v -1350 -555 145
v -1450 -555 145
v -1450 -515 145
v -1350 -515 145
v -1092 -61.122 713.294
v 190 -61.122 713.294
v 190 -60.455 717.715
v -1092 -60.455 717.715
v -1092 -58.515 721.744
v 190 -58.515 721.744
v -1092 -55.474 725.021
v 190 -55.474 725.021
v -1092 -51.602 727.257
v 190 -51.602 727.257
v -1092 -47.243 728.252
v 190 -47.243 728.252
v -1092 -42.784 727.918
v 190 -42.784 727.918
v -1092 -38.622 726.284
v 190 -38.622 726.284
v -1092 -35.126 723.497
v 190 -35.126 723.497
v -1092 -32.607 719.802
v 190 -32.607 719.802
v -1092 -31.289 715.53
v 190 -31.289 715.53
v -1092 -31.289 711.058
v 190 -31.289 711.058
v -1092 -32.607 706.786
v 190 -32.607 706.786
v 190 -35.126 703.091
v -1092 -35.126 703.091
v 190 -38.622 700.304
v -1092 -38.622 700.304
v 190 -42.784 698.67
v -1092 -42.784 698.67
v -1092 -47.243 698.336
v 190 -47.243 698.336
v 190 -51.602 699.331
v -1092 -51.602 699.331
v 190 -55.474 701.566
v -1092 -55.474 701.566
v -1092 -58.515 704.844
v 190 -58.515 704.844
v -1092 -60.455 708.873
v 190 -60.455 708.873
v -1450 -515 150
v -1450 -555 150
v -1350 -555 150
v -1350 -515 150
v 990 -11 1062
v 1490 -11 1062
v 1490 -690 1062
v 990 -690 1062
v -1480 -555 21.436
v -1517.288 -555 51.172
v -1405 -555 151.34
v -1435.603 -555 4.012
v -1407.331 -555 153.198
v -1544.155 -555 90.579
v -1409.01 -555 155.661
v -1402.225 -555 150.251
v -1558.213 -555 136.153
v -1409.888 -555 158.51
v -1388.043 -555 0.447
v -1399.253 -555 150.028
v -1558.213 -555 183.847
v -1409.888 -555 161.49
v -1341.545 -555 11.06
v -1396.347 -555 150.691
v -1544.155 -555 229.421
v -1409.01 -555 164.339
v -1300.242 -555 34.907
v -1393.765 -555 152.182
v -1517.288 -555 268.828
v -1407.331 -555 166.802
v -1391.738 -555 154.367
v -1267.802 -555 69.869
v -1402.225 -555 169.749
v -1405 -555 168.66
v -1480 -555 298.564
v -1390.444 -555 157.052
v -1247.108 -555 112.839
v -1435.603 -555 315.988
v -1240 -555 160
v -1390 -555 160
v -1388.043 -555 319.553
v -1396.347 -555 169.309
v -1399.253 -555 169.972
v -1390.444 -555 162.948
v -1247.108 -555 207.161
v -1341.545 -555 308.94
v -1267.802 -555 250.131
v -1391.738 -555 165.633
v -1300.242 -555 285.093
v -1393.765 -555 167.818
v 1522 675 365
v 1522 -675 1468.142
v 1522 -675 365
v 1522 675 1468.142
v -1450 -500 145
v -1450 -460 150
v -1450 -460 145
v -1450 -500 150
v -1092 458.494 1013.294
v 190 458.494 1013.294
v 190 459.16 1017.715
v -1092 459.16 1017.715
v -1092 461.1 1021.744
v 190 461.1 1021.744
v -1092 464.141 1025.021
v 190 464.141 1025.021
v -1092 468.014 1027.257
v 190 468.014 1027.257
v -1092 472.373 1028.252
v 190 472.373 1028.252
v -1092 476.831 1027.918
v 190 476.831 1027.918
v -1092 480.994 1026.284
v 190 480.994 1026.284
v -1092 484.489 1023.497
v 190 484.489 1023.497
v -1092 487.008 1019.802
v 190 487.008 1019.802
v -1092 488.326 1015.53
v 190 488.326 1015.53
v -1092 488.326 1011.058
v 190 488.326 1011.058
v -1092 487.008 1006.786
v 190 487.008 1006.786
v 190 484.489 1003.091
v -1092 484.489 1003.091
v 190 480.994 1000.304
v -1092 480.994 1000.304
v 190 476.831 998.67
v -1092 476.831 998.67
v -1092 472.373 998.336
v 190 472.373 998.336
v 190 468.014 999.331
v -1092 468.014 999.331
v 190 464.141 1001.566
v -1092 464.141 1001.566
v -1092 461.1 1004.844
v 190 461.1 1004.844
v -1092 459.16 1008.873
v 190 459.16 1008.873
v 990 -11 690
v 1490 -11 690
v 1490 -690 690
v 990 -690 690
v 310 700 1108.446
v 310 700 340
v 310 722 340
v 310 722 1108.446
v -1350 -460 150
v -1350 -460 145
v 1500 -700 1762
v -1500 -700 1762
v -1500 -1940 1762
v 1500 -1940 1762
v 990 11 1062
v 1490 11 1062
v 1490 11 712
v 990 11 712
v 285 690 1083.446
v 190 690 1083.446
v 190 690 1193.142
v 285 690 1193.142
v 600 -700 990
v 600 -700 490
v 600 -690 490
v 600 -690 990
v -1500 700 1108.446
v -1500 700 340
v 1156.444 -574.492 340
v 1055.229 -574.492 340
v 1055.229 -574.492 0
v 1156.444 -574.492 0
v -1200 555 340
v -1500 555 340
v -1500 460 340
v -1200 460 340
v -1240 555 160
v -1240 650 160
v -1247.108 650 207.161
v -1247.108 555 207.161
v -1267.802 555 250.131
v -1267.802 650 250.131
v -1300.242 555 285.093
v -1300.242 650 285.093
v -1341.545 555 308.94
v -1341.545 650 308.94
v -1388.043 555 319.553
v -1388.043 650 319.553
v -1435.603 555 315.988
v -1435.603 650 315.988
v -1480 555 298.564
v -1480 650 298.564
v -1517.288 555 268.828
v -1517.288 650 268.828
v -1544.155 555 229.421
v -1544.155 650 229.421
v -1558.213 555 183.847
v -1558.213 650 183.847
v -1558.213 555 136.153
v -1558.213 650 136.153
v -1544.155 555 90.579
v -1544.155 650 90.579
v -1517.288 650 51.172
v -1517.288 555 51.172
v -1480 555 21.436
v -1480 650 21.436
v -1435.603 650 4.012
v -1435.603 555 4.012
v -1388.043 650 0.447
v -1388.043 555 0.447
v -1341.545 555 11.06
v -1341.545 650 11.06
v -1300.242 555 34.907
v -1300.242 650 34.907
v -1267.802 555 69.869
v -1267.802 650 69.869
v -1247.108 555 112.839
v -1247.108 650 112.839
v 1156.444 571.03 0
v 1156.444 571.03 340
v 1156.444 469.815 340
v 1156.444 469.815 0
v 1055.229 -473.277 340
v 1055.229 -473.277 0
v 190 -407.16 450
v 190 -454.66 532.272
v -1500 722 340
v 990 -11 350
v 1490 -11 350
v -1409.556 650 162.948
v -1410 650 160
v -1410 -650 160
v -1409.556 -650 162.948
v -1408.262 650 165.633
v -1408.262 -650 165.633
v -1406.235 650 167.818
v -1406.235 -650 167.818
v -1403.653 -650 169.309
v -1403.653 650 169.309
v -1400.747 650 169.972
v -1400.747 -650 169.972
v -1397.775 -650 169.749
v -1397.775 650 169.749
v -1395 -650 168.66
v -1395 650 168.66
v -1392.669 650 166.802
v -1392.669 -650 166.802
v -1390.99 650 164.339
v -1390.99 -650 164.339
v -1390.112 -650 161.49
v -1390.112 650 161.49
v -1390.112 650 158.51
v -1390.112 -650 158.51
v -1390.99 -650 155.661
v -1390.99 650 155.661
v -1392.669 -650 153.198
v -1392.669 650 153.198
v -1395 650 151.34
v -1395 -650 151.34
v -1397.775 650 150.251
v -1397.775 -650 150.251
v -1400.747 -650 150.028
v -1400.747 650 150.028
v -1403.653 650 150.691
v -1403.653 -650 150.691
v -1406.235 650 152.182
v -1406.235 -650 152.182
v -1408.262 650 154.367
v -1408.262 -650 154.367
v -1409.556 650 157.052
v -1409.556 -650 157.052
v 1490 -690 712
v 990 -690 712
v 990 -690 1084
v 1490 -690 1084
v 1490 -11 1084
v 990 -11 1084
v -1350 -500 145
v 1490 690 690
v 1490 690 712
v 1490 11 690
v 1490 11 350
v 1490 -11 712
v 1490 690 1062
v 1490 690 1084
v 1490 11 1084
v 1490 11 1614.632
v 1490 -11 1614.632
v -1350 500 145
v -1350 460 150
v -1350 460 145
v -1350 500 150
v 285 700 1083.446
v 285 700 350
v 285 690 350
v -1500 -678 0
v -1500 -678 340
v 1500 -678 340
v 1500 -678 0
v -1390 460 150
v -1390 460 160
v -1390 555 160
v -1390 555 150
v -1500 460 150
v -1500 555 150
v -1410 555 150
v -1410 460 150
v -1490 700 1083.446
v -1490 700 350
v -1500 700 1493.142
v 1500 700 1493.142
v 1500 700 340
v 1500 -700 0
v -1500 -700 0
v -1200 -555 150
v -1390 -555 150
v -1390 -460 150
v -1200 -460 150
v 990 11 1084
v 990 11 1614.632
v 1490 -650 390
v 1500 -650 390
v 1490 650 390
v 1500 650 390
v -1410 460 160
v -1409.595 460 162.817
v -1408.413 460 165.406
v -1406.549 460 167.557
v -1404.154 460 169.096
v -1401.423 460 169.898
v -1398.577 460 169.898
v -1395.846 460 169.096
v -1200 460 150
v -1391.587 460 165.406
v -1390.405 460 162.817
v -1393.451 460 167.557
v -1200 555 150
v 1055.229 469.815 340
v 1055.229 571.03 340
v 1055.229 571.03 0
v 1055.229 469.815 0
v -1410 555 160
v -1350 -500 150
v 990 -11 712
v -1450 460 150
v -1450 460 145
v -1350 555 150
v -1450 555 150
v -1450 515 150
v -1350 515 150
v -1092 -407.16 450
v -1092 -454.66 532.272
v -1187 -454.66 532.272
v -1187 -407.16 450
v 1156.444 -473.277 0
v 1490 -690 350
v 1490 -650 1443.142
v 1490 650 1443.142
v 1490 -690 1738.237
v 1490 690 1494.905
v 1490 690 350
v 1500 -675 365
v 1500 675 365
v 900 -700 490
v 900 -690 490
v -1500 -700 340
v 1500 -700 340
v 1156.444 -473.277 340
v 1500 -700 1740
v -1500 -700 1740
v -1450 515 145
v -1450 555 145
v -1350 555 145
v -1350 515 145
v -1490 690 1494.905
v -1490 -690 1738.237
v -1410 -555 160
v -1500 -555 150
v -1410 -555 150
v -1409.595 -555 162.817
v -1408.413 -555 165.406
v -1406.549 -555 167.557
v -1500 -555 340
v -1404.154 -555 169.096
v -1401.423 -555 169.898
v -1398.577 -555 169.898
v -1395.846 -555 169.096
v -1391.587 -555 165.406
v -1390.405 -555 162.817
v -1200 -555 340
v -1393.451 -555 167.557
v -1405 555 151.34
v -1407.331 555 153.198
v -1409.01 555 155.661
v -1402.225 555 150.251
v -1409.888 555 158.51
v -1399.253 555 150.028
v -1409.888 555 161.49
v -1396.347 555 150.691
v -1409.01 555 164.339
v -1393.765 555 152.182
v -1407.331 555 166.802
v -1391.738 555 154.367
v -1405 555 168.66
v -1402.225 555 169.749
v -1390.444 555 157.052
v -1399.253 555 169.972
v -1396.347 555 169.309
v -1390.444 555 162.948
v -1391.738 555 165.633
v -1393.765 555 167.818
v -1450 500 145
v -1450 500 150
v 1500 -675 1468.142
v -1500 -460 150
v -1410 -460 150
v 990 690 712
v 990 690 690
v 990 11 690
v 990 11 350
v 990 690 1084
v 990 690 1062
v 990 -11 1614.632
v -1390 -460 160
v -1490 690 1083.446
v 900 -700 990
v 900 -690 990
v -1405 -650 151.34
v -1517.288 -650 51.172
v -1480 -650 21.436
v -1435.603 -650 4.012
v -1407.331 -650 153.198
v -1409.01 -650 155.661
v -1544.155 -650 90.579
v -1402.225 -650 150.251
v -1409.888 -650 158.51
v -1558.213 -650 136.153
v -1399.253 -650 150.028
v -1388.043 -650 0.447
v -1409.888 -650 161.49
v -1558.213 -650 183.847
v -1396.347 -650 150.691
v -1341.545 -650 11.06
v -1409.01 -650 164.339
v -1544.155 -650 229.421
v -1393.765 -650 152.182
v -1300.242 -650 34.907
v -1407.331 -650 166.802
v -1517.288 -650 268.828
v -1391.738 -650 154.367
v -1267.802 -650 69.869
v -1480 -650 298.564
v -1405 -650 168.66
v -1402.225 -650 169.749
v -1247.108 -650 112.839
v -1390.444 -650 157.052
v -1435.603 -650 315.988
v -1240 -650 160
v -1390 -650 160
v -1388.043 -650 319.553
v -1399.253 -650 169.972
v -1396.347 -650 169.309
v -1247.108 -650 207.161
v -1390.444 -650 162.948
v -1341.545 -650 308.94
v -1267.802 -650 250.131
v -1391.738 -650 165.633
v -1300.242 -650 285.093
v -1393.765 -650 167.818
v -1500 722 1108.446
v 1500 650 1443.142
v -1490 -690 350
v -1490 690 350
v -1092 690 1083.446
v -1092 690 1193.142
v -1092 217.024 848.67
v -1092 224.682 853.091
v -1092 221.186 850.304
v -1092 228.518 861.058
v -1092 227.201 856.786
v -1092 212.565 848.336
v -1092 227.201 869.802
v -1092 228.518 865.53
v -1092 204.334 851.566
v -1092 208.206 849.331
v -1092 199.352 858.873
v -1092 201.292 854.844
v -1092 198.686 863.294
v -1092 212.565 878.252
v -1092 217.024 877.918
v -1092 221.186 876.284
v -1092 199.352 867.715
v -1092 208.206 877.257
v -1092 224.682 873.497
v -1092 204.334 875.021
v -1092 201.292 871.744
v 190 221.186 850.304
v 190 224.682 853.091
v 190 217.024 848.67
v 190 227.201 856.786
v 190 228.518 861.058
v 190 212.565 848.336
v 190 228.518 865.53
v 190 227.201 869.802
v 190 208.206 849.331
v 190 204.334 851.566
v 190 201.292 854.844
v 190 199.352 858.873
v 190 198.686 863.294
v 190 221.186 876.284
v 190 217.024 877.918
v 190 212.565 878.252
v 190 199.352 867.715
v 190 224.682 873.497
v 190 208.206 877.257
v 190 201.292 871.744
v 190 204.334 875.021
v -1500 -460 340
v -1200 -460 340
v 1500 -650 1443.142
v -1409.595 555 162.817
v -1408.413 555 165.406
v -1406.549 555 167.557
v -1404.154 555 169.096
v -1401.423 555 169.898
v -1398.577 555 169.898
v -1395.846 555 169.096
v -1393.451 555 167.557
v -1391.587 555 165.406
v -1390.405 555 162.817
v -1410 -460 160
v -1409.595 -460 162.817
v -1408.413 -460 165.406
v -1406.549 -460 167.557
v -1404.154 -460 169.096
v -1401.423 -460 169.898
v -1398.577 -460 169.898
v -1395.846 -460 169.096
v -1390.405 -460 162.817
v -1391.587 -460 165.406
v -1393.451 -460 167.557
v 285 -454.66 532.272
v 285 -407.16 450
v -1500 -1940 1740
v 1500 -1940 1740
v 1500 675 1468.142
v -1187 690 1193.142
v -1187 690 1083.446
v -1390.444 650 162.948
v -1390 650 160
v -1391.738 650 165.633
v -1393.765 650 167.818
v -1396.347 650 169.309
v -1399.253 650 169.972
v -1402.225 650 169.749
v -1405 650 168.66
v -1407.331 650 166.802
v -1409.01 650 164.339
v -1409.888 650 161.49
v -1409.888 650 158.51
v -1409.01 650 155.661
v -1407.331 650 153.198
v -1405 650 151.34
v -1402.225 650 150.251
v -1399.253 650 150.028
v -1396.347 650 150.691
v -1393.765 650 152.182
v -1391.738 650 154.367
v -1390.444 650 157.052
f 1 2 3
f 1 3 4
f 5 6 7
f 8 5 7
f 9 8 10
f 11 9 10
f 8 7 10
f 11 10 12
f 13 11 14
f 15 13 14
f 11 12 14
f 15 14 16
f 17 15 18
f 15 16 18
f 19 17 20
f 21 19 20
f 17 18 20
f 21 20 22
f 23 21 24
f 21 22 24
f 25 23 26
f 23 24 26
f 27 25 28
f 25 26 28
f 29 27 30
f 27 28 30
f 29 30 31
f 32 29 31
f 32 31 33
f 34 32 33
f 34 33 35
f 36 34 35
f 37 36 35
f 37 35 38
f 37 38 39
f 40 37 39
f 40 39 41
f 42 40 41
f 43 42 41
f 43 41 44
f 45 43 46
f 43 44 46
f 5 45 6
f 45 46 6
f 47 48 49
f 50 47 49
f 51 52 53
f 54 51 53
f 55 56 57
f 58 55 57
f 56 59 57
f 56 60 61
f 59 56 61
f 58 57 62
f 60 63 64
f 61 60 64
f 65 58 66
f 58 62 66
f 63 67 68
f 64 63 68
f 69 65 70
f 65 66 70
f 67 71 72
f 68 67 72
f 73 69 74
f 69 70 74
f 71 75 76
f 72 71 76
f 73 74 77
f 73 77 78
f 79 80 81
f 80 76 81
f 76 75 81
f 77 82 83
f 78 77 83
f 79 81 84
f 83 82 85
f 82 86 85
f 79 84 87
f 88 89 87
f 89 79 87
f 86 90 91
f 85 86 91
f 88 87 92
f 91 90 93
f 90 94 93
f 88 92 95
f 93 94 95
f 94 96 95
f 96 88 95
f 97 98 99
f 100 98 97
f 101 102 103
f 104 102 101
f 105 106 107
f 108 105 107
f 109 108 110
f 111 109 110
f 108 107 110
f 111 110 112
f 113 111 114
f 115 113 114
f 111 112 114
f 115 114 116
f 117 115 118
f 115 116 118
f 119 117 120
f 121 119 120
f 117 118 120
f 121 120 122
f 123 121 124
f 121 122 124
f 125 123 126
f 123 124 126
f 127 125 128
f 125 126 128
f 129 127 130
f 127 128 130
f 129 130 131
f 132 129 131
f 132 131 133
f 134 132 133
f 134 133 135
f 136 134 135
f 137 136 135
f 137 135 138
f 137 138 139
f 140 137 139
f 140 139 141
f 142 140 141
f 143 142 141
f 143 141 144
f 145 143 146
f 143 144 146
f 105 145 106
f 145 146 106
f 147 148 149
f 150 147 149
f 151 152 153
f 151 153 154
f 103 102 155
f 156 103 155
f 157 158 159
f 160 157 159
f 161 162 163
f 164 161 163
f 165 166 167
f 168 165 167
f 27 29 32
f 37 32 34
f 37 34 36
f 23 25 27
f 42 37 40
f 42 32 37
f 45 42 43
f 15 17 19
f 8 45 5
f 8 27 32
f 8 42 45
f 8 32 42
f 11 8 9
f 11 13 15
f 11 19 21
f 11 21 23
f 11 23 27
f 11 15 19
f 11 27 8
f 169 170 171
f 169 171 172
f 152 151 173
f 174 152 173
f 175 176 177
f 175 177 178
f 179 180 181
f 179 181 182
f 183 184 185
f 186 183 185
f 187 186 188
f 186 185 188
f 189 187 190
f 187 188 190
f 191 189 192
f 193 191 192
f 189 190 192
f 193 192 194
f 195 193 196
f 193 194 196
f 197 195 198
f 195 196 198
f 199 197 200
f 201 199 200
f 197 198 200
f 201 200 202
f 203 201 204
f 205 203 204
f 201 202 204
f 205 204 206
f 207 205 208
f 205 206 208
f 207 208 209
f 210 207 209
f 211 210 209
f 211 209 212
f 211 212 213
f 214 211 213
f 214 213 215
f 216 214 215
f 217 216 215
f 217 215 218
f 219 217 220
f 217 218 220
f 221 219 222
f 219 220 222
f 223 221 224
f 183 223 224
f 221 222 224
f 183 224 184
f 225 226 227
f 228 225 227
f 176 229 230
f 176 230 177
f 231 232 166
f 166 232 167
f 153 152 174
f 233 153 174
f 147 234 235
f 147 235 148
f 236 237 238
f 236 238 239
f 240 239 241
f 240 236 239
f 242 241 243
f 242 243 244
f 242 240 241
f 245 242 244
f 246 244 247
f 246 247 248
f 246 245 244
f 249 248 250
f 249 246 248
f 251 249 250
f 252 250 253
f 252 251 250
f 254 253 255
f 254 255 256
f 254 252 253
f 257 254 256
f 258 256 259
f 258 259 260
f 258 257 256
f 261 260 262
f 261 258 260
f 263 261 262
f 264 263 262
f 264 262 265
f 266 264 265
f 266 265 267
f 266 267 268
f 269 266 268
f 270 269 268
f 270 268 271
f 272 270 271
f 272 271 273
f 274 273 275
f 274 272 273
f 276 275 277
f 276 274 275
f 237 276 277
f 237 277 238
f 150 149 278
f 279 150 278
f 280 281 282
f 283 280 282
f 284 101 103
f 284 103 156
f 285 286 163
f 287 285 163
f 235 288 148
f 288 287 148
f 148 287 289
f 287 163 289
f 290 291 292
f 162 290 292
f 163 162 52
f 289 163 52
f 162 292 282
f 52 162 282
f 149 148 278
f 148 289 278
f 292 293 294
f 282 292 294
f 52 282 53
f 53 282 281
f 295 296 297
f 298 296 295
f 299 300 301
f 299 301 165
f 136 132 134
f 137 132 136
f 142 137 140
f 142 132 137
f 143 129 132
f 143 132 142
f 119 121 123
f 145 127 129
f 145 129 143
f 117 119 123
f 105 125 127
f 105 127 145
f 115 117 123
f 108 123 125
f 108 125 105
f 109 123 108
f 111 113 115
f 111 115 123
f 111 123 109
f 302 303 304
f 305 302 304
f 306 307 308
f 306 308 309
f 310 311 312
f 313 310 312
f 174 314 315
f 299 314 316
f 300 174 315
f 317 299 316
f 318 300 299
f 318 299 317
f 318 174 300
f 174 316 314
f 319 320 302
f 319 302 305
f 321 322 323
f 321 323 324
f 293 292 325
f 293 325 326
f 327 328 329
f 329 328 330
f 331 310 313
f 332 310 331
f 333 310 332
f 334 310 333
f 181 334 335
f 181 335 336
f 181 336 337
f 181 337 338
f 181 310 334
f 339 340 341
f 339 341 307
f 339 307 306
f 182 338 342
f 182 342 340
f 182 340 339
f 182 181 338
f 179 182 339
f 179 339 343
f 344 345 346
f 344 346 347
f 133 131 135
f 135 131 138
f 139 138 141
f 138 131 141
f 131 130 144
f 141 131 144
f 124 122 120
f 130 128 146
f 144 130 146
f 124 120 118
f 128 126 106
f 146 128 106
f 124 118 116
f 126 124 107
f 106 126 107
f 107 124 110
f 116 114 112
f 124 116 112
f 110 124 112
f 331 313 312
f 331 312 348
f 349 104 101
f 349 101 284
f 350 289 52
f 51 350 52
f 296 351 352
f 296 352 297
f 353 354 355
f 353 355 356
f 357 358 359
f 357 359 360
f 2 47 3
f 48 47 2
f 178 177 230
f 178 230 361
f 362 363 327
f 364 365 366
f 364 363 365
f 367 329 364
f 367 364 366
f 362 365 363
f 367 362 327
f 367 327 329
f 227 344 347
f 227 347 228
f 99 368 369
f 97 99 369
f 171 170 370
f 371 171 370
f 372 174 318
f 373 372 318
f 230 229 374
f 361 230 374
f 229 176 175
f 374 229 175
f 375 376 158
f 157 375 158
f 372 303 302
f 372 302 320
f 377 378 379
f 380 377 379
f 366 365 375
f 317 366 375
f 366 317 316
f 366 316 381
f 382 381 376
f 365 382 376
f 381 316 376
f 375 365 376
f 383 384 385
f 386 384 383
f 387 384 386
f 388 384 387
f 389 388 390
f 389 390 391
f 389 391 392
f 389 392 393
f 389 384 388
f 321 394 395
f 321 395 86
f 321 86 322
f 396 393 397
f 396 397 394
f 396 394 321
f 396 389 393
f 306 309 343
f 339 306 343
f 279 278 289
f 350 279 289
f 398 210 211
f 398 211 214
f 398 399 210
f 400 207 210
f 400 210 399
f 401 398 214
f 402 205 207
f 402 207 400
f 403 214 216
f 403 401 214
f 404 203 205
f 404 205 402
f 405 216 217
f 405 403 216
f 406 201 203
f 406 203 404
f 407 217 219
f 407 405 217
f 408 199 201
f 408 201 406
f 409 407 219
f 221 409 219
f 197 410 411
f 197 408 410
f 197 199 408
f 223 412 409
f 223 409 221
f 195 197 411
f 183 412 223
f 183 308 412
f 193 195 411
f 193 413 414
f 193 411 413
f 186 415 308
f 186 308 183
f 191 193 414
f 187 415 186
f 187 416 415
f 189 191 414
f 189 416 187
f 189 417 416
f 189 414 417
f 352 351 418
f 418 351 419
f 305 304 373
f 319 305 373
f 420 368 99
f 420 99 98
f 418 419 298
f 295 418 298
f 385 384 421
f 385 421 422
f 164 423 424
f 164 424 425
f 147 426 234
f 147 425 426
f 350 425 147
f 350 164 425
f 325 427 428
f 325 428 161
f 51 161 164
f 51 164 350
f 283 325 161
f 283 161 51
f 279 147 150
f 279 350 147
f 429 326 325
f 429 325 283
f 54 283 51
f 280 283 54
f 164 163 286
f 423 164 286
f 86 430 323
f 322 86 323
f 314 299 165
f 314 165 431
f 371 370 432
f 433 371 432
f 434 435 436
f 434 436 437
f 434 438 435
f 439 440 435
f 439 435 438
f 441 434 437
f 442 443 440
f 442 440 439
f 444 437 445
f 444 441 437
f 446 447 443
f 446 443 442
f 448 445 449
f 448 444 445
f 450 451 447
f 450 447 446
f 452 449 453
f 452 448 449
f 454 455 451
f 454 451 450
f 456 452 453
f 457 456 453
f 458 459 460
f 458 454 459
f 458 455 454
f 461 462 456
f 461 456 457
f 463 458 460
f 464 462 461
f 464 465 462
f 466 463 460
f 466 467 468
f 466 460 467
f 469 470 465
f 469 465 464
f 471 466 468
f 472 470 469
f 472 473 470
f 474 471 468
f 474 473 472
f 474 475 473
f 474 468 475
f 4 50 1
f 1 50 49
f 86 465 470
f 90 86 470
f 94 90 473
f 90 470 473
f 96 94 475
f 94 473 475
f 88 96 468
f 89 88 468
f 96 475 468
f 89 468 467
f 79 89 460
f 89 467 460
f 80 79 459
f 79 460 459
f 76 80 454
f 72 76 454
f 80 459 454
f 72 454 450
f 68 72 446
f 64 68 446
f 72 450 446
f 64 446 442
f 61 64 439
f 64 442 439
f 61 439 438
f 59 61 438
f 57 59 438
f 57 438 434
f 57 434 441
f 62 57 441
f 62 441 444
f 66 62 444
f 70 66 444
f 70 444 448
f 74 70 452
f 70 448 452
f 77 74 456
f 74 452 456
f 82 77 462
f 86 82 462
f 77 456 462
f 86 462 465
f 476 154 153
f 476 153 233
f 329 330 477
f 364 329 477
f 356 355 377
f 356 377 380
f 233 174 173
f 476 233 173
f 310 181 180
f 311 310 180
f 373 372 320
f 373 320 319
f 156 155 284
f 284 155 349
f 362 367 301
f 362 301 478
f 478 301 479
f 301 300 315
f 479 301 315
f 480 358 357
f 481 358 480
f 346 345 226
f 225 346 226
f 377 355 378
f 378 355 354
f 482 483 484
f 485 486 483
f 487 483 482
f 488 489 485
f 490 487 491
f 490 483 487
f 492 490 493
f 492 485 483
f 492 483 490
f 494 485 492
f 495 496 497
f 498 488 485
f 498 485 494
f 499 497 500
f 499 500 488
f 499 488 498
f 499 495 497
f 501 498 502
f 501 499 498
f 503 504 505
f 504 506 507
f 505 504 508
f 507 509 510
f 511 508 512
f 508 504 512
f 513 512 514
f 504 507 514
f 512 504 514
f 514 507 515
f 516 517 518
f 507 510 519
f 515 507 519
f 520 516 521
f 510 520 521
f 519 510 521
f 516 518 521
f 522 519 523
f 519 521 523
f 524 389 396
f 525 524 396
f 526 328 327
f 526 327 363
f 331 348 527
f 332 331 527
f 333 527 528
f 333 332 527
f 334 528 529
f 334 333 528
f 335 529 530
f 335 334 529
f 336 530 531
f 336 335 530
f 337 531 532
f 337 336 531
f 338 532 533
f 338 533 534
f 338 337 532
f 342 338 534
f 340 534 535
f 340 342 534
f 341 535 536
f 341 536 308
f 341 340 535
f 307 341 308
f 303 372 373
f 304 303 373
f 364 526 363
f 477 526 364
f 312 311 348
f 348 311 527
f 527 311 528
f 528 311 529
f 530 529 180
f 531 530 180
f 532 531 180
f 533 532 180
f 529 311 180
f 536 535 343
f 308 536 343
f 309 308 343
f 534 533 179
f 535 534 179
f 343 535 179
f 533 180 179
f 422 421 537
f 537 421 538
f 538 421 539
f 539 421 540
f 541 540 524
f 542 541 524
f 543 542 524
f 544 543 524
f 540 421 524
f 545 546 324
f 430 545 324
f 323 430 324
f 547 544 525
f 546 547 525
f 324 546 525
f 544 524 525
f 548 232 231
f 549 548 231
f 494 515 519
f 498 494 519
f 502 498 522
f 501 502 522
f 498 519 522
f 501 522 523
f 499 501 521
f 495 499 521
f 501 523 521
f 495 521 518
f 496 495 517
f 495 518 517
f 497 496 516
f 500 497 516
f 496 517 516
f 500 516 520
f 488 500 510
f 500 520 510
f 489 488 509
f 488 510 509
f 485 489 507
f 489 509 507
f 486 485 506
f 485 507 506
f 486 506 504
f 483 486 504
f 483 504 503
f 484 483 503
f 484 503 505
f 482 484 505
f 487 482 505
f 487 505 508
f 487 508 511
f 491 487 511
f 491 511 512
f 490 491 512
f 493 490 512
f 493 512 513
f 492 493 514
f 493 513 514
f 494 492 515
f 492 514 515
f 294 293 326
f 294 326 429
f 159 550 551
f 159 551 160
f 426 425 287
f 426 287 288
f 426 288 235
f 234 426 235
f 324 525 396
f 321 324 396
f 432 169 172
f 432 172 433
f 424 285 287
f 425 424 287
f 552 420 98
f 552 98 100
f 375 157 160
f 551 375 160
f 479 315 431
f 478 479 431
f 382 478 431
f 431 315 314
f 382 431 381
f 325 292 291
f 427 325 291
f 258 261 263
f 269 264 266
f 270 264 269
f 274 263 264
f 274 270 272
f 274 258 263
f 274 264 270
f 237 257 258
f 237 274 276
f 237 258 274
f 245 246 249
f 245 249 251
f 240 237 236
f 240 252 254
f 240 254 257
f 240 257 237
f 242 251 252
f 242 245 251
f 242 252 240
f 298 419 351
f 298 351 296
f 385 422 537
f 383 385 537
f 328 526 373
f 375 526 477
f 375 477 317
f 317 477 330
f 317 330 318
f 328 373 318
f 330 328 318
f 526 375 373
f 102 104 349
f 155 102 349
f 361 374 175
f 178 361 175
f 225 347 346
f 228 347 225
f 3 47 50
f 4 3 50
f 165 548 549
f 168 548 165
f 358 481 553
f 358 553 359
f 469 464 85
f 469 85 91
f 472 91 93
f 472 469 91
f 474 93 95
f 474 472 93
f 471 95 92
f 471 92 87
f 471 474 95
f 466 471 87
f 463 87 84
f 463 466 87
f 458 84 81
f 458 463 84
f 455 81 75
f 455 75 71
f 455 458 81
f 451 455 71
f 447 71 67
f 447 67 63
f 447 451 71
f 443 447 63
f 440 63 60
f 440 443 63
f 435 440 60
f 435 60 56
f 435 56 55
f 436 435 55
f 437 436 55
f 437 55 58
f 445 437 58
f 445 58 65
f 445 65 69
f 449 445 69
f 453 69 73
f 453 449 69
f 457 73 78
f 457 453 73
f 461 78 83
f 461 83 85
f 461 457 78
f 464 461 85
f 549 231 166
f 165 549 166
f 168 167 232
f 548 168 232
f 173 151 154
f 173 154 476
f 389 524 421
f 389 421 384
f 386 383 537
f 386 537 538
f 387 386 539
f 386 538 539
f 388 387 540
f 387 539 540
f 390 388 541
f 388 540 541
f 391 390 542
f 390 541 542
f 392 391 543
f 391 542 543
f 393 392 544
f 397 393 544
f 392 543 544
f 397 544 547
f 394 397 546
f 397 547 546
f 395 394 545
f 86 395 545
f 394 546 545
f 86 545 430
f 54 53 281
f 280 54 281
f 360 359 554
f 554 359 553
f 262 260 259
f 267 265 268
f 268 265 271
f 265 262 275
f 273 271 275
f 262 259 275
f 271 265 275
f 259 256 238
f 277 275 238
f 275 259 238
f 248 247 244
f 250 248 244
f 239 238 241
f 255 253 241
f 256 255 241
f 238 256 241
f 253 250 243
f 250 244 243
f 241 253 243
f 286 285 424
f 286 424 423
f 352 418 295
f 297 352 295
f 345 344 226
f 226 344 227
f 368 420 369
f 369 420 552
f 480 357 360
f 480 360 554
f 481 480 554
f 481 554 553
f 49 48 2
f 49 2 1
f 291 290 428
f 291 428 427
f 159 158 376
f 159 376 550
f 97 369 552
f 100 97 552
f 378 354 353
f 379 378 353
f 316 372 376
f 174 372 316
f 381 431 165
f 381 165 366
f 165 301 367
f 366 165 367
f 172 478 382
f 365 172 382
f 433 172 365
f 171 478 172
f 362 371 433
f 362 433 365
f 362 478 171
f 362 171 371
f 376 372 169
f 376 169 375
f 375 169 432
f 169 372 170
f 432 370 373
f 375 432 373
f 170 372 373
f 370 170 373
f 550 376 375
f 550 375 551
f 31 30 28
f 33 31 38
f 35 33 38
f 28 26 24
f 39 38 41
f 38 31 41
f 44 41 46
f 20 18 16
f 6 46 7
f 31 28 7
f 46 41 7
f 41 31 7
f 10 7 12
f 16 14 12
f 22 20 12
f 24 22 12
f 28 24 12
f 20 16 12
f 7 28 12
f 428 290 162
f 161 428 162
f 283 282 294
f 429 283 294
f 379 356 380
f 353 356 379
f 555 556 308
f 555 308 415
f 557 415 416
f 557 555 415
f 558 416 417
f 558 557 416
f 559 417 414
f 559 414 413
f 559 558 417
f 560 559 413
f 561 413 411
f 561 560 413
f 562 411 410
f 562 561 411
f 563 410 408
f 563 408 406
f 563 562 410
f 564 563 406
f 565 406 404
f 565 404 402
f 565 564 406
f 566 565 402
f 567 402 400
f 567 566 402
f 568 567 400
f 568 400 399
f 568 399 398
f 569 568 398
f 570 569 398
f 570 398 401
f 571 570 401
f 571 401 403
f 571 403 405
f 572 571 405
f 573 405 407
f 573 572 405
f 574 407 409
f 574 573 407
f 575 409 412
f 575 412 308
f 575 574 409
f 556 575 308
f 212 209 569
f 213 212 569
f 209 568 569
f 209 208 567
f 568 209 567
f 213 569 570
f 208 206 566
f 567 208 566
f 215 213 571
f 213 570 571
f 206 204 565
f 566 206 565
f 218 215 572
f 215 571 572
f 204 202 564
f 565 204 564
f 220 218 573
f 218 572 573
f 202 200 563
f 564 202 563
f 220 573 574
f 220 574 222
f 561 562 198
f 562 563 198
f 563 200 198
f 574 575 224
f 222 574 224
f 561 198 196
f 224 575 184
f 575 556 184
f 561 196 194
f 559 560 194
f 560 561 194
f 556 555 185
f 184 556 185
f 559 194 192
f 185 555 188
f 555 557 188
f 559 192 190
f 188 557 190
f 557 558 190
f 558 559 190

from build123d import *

# Parameters (mm, degrees)
F5_W      = 3000
F5_H      = 1400
F6_DEPTH  = 1400
F7_T      = -10
F10_DEPTH = 3000.001
F11_W     = 22
F11_H     = 340
F11_H_2   = 22
F11_W_2   = 679
F11_H_3   = 350
F11_H_4   = 530.6315167163
F12_DEPTH = 500
F13_W     = 1300
F13_H     = 1053.1422270081
F14_DEPTH = 25
F15_W     = 1350
F15_H     = 1103.1422270081
F16_DEPTH = 22
F19_DEPTH = 95
F21_R     = 15
F22_DEPTH = 1282
F23_W     = 300
F23_H     = 500
F24_DEPTH = 25
F25_W     = 1240
F25_H     = 22
F26_DEPTH = 3000
F27_W     = 1775
F27_H     = 733.4456758621
F28_DEPTH = 25
F29_W     = 1810
F29_H     = 768.4456758621
F30_DEPTH = 22
F31_W     = 3000
F31_H     = 22
F32_DEPTH = 340
F33_W     = 101.2148975914
F33_H     = 101.2148975914
F34_DEPTH = 340
F36_R     = 160
F36_R_2   = 10
F37_DEPTH = 95
F38_W     = 300
F38_H     = 95
F39_DEPTH = 190
F41_DEPTH = 1480.001
F42_W     = 100
F42_H     = 40
F43_DEPTH = 5
F45_R     = 10
F46_DEPTH = 1300


# Not quite as in the source:
# - a feature of the source that left no trace in its solid (it failed there, or was rolled back) is left out
# - a pattern or mirror of a feature is missing from the dataset's text; its kind, count and spacing are read off the source's solid


with BuildPart() as f6:
    # F5 (on offset) → F6 (new body)
    with BuildSketch(Plane.XY.offset(340)):
        Rectangle(F5_W, F5_H)
    extrude(amount=F6_DEPTH)

    # F7
    f7_openings = [f6.faces().sort_by_distance(p)[0] for p in [
        (0, 0, 1740),
    ]]
    offset(amount=F7_T, openings=f7_openings)

    # F9 (on face) → F10 (cut, through all)
    with BuildSketch(Plane(origin=(-1500, 0, 0), x_dir=(0, -1, 0), z_dir=(-1, 0, 0))):
        Polygon((-923.6419556025, 1453.708116217), (851.2289943782, 1766.6657519743), (692.6008882609, 2226.9985032484), (-1018.4111959435, 1991.1711860221), align=None)
    extrude(amount=-F10_DEPTH, mode=Mode.SUBTRACT)

    # F13 (on face) → F14 (cut)
    with BuildSketch(Plane.YZ.offset(1500)):
        with Locations((0, 916.5711135041)):
            Rectangle(F13_W, F13_H)
    extrude(amount=-F14_DEPTH, mode=Mode.SUBTRACT)

    # F23 (on face) → F24 (cut)
    with BuildSketch(Plane.XZ.offset(700)):
        with Locations((750, 740)):
            Rectangle(F23_W, F23_H)
    extrude(amount=-F24_DEPTH, mode=Mode.SUBTRACT)

    # F27 (on face) → F28 (cut)
    with BuildSketch(Plane(origin=(0, 700, 0), x_dir=(-1, 0, 0), z_dir=(0, 1, 0))):
        with Locations((602.5, 716.7228379311)):
            Rectangle(F27_W, F27_H)
    extrude(amount=-F28_DEPTH, mode=Mode.SUBTRACT)


with BuildPart() as f12:
    # F11 (on face) → F12 (new body)
    with BuildSketch(Plane(origin=(1490, 0, 0), x_dir=(0, -1, 0), z_dir=(-1, 0, 0))):
        with Locations((0, 520)):
            Rectangle(F11_W, F11_H)
        with Locations((0, 701)):
            Rectangle(F11_W, F11_H_2)
        with Locations((350.5, 701)):
            Rectangle(F11_W_2, F11_H_2)
        with Locations((-350.5, 701)):
            Rectangle(F11_W_2, F11_H_2)
        with Locations((0, 887)):
            Rectangle(F11_W, F11_H_3)
        with Locations((0, 1073)):
            Rectangle(F11_W, F11_H_2)
        with Locations((350.5, 1073)):
            Rectangle(F11_W_2, F11_H_2)
        with Locations((-350.5, 1073)):
            Rectangle(F11_W_2, F11_H_2)
        with Locations((0, 1349.3157583581)):
            Rectangle(F11_W, F11_H_4)
    extrude(amount=F12_DEPTH)


with BuildPart() as f16:
    # F15 (on face) → F16 (new body)
    with BuildSketch(Plane.YZ.offset(1500)):
        with Locations((0, 916.5711135041)):
            Rectangle(F15_W, F15_H)
    extrude(amount=F16_DEPTH)


with BuildPart() as f19:
    # F18 (on offset) → F19 (new body)
    with BuildSketch(Plane.YZ.offset(190)):
        Polygon((690, 1083.4456758621), (690, 1193.1422270081), (-454.660094428, 532.2724133595), (-407.160094428, 450), align=None)
    extrude(amount=F19_DEPTH)


with BuildPart() as f19_copies_1:
    # F19_copies: instance of F19
    add(f19.part.mirror(Plane(origin=(-451, 0, 0), x_dir=(0, 0, -1), z_dir=(-1, 0, 0))))


with BuildPart() as f22:
    # F21 (on face) → F22 (new body, through all)
    with BuildSketch(Plane(origin=(190, 0, 0), x_dir=(0, -1, 0), z_dir=(-1, 0, 0))):
        with Locations((-473.4936490539, 1013.2939514351)):
            Circle(F21_R)
    extrude(amount=F22_DEPTH)


with BuildPart() as f22b:
    # F21 (on face) → F22, piece 2 (new body, through all)
    with BuildSketch(Plane(origin=(190, 0, 0), x_dir=(0, -1, 0), z_dir=(-1, 0, 0))):
        with Locations((-213.6860279186, 863.2939514351)):
            Circle(F21_R)
    extrude(amount=F22_DEPTH)


with BuildPart() as f22c:
    # F21 (on face) → F22, piece 3 (new body, through all)
    with BuildSketch(Plane(origin=(190, 0, 0), x_dir=(0, -1, 0), z_dir=(-1, 0, 0))):
        with Locations((46.1215932168, 713.2939514351)):
            Circle(F21_R)
    extrude(amount=F22_DEPTH)


with BuildPart() as f26:
    # F25 (on face) → F26 (new body, through all)
    with BuildSketch(Plane(origin=(-1500, 0, 0), x_dir=(0, -1, 0), z_dir=(-1, 0, 0))):
        with Locations((1320, 1751)):
            Rectangle(F25_W, F25_H)
    extrude(amount=-F26_DEPTH)


with BuildPart() as f30:
    # F29 (on face) → F30 (new body)
    with BuildSketch(Plane(origin=(0, 700, 0), x_dir=(-1, 0, 0), z_dir=(0, 1, 0))):
        with Locations((595, 724.2228379311)):
            Rectangle(F29_W, F29_H)
    extrude(amount=F30_DEPTH)


with BuildPart() as f32:
    # F31 (on face) → F32 (new body)
    with BuildSketch(Plane(origin=(0, 0, 340), x_dir=(1, 0, 0), z_dir=(0, 0, -1))):
        with Locations((0, 689)):
            Rectangle(F31_W, F31_H)
    extrude(amount=F32_DEPTH)


with BuildPart() as f34:
    # F33 (on face) → F34 (new body)
    with BuildSketch(Plane(origin=(0, 0, 340), x_dir=(1, 0, 0), z_dir=(0, 0, -1))):
        with Locations((1105.8368849942, 523.8840551683)):
            Rectangle(F33_W, F33_H)
    extrude(amount=F34_DEPTH)


with BuildPart() as f34b:
    # F33 (on face) → F34, piece 2 (new body)
    with BuildSketch(Plane(origin=(0, 0, 340), x_dir=(1, 0, 0), z_dir=(0, 0, -1))):
        with Locations((1105.8368849942, -520.4225837978)):
            Rectangle(F33_W, F33_H)
    extrude(amount=F34_DEPTH)


with BuildPart() as f37:
    # F36 (on offset) → F37 (new body)
    with BuildSketch(Plane.XZ.offset(650)):
        with Locations((-1400, 160)):
            Circle(F36_R)
        with Locations((-1400, 160)):
            Circle(F36_R_2, mode=Mode.SUBTRACT)
    extrude(amount=-F37_DEPTH)


with BuildPart() as f39:
    # F38 (on face) → F39 (new body)
    with BuildSketch(Plane(origin=(0, 0, 340), x_dir=(1, 0, 0), z_dir=(0, 0, -1))):
        with Locations((-1350, 507.5)):
            Rectangle(F38_W, F38_H)
    extrude(amount=F39_DEPTH)

    # F40 (on face) → F41 (cut, through all)
    with BuildSketch(Plane(origin=(0, -460, 0), x_dir=(-1, 0, 0), z_dir=(0, 1, 0))):
        with BuildLine():
            Line((1410, 150), (1410, 160))
            ThreePointArc((1410, 160), (1400, 170), (1390, 160))
            Line((1390, 160), (1390, 150))
            Line((1390, 150), (1410, 150))
        make_face()
    extrude(amount=-F41_DEPTH, mode=Mode.SUBTRACT)


with BuildPart() as f43:
    # F42 (on face) → F43 (new body)
    with BuildSketch(Plane(origin=(0, 0, 150), x_dir=(1, 0, 0), z_dir=(0, 0, -1))):
        with Locations((-1400, 480)):
            Rectangle(F42_W, F42_H)
    extrude(amount=F43_DEPTH)


with BuildPart() as f43b:
    # F42 (on face) → F43, piece 2 (new body)
    with BuildSketch(Plane(origin=(0, 0, 150), x_dir=(1, 0, 0), z_dir=(0, 0, -1))):
        with Locations((-1400, 535)):
            Rectangle(F42_W, F42_H)
    extrude(amount=F43_DEPTH)


with BuildPart() as f44_1:
    # F44: instance of F37
    add(f37.part.mirror(Plane.XZ))


with BuildPart() as f44_2:
    # F44: instance of F39
    add(f39.part.mirror(Plane.XZ))


with BuildPart() as f44_3:
    # F44: instance of F43b
    add(f43b.part.mirror(Plane.XZ))


with BuildPart() as f44_4:
    # F44: instance of F43
    add(f43.part.mirror(Plane.XZ))


with BuildPart() as f46:
    # F45 (on face) → F46 (new body, through all)
    with BuildSketch(Plane(origin=(0, 650, 0), x_dir=(-1, 0, 0), z_dir=(0, 1, 0))):
        with Locations((1400, 160)):
            Circle(F45_R)
    extrude(amount=-F46_DEPTH)


solid = Compound([f6.part, f12.part, f16.part, f19.part, f19_copies_1.part, f22.part, f22b.part, f22c.part, f26.part, f30.part, f32.part, f34.part, f34b.part, f37.part, f39.part, f43.part, f43b.part, f44_1.part, f44_2.part, f44_3.part, f44_4.part, f46.part])
